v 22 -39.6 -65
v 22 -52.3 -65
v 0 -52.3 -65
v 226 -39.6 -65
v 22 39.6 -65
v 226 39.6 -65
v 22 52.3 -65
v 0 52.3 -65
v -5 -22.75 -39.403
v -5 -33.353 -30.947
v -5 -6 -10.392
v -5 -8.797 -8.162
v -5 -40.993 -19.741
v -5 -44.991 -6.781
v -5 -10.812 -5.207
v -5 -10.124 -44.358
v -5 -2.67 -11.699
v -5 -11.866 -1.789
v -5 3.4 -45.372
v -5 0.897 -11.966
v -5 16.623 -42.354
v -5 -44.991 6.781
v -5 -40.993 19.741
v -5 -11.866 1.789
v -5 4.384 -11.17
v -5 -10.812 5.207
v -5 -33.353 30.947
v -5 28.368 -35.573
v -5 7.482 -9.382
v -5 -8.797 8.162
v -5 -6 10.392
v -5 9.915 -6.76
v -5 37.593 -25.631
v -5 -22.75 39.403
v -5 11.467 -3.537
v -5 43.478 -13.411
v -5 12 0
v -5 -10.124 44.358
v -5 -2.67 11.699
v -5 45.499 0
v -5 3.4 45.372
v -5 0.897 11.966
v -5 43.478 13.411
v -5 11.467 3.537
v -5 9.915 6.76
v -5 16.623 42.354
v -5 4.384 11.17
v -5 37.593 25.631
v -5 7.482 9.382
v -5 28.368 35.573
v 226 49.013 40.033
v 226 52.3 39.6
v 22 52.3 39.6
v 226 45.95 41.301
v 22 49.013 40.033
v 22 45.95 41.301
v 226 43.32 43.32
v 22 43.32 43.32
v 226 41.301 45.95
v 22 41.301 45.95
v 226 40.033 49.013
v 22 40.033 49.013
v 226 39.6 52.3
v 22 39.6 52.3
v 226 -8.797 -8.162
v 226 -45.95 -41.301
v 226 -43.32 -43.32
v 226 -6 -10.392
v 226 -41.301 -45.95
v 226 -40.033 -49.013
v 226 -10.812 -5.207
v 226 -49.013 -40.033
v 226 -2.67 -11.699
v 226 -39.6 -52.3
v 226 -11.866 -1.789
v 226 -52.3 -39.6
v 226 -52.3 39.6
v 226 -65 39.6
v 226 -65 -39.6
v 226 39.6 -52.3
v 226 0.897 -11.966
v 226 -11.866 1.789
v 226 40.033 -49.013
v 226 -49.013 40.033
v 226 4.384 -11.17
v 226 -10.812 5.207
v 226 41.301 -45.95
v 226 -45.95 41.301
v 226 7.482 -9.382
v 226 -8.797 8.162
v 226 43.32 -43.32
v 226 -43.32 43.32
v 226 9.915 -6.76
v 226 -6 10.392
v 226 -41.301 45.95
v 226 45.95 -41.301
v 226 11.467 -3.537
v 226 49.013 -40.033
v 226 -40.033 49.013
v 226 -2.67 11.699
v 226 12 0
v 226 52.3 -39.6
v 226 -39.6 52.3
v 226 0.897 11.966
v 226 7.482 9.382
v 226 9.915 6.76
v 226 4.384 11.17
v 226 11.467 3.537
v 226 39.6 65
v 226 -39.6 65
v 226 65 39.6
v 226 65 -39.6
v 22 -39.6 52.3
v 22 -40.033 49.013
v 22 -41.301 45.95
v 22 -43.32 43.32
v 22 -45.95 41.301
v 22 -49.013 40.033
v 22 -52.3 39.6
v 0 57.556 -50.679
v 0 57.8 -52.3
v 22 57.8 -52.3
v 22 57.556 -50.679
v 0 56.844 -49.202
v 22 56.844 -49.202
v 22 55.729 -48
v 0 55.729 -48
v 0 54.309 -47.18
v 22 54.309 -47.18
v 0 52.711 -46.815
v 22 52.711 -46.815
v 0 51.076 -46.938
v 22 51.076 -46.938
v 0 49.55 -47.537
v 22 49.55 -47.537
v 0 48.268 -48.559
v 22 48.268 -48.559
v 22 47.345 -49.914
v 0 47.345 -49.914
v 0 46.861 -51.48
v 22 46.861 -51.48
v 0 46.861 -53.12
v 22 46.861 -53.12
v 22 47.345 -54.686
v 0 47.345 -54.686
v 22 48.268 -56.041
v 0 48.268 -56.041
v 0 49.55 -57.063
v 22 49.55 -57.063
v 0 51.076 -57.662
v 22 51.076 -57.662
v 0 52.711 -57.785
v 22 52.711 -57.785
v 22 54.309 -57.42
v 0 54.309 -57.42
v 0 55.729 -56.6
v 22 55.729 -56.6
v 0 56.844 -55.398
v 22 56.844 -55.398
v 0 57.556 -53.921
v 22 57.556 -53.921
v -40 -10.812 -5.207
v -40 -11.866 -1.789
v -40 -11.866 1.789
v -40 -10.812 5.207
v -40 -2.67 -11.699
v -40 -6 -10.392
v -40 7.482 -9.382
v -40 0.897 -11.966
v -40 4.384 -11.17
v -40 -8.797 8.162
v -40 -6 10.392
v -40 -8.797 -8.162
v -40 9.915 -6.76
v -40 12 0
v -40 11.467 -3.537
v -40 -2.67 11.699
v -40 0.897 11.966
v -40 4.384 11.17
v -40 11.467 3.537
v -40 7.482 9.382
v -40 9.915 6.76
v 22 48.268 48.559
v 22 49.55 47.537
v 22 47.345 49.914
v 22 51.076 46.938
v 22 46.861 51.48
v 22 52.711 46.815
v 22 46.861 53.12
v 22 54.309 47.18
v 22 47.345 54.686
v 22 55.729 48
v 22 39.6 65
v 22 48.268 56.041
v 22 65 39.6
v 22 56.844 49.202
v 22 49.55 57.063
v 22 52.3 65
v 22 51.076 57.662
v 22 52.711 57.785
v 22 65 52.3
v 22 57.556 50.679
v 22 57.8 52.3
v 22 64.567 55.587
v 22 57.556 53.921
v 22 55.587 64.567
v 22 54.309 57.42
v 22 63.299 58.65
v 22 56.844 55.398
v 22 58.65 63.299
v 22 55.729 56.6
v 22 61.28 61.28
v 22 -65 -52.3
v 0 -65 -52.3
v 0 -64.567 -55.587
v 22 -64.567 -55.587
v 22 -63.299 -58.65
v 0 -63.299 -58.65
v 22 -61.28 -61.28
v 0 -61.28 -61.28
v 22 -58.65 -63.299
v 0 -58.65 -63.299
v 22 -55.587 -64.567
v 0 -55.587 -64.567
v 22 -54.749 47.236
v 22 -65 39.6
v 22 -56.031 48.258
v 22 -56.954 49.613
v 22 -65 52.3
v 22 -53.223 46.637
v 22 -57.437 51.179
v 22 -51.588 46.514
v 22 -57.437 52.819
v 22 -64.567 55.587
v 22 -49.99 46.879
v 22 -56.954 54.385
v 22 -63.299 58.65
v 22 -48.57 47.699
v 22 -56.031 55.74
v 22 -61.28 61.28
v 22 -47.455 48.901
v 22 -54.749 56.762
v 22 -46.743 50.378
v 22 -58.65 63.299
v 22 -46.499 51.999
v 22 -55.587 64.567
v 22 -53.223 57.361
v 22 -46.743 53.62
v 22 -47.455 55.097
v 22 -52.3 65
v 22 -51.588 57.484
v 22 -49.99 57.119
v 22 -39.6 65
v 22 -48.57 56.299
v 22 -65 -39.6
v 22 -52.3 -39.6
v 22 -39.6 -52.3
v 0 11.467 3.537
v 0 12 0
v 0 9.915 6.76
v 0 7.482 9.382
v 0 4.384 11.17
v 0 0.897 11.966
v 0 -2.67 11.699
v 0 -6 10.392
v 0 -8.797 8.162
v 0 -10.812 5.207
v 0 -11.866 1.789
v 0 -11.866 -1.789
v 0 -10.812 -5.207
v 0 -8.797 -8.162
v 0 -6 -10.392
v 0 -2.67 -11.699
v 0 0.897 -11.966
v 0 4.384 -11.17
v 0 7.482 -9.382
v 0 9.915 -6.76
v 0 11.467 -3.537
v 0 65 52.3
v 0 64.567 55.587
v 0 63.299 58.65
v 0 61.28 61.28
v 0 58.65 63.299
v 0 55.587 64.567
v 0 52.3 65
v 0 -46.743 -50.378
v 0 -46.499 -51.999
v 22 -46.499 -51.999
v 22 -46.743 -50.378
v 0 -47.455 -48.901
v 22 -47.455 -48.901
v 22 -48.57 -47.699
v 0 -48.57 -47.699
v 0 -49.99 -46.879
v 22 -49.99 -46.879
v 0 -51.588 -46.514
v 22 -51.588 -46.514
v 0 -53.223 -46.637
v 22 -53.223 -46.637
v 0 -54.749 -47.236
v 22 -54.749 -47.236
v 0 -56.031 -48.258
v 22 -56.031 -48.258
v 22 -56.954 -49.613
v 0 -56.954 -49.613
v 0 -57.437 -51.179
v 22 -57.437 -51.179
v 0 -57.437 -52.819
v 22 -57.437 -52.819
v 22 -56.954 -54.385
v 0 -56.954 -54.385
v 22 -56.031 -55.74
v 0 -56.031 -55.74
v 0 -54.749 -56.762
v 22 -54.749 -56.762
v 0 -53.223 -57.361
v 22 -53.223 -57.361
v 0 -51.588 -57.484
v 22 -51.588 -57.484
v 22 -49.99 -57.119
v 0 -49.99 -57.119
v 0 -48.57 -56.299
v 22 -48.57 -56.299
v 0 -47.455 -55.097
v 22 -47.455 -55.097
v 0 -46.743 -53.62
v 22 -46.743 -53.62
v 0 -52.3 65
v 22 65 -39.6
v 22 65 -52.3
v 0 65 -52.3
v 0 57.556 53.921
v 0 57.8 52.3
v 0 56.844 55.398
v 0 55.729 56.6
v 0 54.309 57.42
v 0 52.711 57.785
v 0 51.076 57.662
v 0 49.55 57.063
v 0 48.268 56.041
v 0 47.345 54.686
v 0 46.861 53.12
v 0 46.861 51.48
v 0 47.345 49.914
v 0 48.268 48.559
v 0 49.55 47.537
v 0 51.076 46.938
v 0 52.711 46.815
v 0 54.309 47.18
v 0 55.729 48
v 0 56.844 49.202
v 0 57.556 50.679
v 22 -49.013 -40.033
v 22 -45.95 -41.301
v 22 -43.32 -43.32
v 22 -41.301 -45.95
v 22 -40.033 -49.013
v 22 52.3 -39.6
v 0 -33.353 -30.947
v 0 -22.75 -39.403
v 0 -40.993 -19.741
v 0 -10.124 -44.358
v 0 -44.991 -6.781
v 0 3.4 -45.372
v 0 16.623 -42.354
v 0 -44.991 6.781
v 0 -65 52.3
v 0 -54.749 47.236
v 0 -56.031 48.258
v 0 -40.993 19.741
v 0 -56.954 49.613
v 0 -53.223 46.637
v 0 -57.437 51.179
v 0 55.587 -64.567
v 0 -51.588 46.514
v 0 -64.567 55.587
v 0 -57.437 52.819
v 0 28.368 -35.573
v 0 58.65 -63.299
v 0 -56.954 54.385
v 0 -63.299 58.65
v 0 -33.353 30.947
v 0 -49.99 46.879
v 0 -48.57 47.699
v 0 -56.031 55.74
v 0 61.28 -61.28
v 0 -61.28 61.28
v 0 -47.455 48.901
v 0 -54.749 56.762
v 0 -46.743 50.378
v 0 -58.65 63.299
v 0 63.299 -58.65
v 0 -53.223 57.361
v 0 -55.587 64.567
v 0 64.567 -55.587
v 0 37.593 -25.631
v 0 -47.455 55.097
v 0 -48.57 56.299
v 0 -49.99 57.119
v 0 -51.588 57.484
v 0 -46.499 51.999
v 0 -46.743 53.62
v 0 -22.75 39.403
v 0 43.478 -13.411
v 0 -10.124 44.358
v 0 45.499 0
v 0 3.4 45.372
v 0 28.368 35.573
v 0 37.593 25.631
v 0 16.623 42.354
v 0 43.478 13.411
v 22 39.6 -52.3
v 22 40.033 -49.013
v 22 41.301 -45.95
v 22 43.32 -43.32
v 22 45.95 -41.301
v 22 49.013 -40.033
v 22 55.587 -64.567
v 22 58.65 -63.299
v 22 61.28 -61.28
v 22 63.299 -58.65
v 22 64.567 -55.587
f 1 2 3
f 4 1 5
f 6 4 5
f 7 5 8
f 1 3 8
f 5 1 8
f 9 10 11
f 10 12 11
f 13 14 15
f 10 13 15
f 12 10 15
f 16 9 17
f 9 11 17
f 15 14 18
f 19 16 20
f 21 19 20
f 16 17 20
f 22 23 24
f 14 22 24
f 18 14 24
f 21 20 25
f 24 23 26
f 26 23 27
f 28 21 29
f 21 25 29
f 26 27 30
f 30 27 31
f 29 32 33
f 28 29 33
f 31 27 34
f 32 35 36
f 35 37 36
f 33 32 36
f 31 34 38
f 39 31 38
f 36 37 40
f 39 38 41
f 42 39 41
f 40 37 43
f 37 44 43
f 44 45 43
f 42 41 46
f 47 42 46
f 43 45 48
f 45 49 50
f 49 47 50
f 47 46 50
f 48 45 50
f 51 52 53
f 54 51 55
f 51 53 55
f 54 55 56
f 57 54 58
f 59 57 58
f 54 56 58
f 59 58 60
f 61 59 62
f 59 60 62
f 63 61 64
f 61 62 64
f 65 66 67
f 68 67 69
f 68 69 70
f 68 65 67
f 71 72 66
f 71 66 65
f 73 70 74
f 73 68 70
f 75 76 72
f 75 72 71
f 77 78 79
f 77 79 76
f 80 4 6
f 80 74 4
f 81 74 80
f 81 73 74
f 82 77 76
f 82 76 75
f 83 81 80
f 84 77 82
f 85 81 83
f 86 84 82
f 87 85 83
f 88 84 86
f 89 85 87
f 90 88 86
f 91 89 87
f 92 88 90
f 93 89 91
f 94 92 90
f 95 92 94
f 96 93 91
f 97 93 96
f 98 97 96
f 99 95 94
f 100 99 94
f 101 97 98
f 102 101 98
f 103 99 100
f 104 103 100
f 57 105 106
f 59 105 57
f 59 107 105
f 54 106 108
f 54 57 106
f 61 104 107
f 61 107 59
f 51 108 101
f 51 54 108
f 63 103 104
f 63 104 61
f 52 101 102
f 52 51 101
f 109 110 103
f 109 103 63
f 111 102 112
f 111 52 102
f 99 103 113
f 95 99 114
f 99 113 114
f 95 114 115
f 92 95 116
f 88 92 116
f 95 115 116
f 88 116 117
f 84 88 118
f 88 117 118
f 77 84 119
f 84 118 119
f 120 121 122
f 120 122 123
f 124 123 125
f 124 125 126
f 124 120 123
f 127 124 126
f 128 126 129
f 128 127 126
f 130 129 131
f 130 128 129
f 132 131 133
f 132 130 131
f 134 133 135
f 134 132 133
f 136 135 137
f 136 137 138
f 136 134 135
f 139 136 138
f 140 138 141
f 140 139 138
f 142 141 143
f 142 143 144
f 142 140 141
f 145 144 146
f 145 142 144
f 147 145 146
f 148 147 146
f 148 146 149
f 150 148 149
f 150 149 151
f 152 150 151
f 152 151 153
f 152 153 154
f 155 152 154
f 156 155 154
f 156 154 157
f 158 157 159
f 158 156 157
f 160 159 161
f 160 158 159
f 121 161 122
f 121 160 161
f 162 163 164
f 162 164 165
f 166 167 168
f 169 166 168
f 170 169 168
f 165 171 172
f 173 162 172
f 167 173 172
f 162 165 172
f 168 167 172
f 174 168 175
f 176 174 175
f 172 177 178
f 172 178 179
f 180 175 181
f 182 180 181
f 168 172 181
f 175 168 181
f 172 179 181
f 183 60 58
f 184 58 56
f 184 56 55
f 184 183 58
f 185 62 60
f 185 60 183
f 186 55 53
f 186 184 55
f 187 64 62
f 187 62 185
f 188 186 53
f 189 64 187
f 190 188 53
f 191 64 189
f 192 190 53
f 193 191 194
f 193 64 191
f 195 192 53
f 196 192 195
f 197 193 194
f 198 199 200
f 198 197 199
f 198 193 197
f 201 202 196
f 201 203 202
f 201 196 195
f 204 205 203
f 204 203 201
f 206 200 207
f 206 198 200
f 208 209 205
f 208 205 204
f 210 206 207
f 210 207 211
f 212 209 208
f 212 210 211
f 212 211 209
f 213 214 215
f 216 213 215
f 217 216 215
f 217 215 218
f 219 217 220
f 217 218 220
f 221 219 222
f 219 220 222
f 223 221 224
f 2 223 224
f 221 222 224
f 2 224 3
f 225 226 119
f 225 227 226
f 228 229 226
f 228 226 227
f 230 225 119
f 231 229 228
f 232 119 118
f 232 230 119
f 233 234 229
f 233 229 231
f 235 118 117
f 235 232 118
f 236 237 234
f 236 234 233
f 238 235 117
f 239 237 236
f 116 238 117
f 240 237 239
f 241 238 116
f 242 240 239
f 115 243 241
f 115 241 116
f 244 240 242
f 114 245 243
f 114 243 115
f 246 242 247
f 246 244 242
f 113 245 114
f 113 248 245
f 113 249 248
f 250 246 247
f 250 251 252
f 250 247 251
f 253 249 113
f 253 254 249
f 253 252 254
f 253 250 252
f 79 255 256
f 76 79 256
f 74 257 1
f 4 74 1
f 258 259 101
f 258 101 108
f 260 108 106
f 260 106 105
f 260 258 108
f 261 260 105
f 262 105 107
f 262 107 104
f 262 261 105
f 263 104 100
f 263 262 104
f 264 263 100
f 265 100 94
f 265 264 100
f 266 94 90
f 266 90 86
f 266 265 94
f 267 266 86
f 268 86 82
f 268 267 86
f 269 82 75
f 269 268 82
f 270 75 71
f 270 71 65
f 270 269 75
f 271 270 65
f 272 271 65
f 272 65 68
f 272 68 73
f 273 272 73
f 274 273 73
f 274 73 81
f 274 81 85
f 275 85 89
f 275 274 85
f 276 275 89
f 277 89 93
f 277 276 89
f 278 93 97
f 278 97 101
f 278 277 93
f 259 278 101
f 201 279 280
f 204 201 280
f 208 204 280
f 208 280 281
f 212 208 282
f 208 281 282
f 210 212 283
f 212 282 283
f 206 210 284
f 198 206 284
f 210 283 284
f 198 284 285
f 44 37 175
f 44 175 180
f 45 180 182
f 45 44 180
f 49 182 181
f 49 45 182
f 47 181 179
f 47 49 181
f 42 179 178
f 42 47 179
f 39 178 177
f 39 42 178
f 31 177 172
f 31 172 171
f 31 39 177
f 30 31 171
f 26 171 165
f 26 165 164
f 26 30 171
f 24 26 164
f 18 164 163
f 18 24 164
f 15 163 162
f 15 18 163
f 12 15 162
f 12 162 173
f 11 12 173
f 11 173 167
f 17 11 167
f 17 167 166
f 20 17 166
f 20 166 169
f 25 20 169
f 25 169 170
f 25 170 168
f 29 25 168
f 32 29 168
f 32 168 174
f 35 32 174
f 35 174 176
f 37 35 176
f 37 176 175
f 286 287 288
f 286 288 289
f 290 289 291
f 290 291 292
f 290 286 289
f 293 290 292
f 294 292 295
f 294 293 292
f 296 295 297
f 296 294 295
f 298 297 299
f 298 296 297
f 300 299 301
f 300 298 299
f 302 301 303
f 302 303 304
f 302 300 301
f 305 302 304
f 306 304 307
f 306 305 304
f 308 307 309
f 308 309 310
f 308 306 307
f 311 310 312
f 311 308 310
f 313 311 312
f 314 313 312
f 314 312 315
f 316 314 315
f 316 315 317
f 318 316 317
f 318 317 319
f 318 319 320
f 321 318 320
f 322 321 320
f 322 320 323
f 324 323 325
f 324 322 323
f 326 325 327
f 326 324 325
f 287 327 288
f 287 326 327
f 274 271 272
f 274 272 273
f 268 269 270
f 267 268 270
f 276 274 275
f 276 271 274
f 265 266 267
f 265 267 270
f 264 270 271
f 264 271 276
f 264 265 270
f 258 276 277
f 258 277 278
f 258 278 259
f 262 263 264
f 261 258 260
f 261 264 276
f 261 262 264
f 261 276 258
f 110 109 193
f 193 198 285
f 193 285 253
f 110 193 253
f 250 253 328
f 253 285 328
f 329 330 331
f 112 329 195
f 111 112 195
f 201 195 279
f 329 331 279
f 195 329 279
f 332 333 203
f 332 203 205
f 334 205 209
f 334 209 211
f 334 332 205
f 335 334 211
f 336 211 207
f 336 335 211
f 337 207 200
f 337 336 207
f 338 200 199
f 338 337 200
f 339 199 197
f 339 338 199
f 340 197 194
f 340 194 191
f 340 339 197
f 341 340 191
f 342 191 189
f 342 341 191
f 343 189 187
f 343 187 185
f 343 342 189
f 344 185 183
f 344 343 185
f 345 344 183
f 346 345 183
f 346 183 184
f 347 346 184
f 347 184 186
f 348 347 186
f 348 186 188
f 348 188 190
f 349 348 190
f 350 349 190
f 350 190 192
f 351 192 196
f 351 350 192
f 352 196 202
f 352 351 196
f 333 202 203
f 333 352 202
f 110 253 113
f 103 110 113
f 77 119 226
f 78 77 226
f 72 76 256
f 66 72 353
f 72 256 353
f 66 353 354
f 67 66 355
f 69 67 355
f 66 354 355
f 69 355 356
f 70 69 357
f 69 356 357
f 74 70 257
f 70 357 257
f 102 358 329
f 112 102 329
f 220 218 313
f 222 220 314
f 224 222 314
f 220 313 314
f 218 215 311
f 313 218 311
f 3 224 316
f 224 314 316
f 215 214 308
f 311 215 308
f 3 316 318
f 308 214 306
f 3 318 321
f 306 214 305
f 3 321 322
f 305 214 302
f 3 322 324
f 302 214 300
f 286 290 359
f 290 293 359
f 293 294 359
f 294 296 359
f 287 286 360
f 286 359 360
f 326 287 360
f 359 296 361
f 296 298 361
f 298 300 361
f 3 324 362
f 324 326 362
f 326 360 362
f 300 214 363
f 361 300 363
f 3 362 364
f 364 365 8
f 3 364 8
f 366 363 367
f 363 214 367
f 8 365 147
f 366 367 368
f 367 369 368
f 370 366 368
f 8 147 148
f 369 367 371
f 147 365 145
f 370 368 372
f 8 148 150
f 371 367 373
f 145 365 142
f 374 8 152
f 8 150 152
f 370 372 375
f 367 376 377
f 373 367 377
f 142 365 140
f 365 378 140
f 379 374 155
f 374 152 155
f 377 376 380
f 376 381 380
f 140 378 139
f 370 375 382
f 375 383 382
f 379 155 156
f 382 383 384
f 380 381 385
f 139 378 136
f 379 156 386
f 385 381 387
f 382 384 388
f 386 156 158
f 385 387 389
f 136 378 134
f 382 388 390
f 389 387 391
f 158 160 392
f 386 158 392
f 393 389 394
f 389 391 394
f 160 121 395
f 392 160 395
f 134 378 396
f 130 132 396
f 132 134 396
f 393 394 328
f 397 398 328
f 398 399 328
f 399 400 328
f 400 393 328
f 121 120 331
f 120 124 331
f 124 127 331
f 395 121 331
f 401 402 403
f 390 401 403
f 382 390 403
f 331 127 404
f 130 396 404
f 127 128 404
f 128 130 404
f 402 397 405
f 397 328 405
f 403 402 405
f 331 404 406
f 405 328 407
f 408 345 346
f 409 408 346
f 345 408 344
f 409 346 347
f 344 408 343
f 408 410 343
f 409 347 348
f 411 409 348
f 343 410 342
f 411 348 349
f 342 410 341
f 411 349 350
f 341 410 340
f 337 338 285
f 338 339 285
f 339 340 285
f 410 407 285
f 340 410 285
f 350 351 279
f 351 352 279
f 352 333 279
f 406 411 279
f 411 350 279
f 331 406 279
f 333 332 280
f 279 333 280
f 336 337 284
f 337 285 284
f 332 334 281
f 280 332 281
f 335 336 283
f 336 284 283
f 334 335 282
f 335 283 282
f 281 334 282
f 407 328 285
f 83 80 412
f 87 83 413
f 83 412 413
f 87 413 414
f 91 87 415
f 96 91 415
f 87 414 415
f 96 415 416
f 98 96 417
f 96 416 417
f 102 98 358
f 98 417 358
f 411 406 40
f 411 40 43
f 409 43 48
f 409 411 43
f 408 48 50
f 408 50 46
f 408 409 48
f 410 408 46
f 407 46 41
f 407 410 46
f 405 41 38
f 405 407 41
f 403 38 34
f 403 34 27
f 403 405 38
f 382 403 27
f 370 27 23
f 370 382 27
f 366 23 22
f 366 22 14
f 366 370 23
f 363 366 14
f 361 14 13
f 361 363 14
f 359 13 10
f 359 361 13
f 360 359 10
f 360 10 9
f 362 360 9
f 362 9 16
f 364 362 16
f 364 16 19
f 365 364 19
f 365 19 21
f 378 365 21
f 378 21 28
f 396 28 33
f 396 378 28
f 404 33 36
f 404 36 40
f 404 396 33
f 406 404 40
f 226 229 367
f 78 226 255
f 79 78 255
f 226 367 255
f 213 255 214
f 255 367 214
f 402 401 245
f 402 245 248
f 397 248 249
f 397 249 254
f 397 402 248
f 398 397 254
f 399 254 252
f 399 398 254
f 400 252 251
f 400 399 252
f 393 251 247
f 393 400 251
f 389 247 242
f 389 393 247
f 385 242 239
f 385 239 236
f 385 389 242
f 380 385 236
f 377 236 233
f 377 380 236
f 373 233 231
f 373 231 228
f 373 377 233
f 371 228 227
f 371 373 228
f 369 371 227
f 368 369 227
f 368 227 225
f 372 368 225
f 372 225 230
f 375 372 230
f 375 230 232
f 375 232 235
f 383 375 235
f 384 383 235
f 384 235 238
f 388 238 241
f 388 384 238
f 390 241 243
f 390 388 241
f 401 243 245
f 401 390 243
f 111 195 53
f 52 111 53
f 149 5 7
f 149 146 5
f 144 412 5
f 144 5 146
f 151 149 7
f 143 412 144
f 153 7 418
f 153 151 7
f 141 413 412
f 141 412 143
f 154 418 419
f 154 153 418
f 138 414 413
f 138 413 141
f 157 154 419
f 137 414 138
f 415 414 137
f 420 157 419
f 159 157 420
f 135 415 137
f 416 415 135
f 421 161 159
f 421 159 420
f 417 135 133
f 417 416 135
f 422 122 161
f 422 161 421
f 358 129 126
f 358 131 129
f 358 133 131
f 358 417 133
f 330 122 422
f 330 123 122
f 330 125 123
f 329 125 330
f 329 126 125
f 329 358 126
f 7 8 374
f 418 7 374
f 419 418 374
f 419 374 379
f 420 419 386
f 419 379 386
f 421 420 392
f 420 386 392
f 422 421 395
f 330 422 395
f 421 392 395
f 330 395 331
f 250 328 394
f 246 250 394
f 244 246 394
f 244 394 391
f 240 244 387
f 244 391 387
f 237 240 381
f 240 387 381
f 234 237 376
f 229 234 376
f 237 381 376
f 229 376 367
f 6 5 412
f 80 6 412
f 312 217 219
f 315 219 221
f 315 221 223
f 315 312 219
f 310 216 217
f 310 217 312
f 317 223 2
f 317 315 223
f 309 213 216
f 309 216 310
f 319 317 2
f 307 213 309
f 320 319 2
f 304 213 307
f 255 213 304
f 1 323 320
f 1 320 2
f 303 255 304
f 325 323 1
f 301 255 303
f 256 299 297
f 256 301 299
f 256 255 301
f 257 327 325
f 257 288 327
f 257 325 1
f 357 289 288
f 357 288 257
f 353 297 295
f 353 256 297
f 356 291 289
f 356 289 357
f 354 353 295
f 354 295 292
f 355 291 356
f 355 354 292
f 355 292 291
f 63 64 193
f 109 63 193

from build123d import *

# Parameters (mm, degrees)
F0_R     = 12
F1_DEPTH = 40
F0_R_2   = 45.49902
F2_DEPTH = 5
F3_DEPTH = 226
F0_R_3   = 5.5
F4_DEPTH = 22


with BuildPart() as f1:
    # F0 (on Right) → F1 (new body)
    with BuildSketch(Plane.YZ):
        Circle(F0_R)
    extrude(amount=-F1_DEPTH)

    # F0 (on Right) → F2 (join)
    with BuildSketch(Plane.YZ):
        Circle(F0_R_2)
        Circle(F0_R, mode=Mode.SUBTRACT)
    extrude(amount=-F2_DEPTH)

    # F0 (on Right) → F3 (join)
    with BuildSketch(Plane.YZ):
        with BuildLine():
            Line((-39.6, -65), (39.6, -65))
            Line((39.6, -65), (39.6, -52.3))
            ThreePointArc((39.6, -52.3), (43.3197438789, -43.3197438789), (52.3, -39.6))
            Line((52.3, -39.6), (65, -39.6))
            Line((65, -39.6), (65, 39.6))
            Line((65, 39.6), (52.3, 39.6))
            ThreePointArc((52.3, 39.6), (43.3197438789, 43.3197438789), (39.6, 52.3))
            Line((39.6, 52.3), (39.6, 65))
            Line((39.6, 65), (-39.6, 65))
            Line((-39.6, 65), (-39.6, 52.3))
            ThreePointArc((-39.6, 52.3), (-43.3197438789, 43.3197438789), (-52.3, 39.6))
            Line((-52.3, 39.6), (-65, 39.6))
            Line((-65, 39.6), (-65, -39.6))
            Line((-65, -39.6), (-52.3, -39.6))
            ThreePointArc((-52.3, -39.6), (-43.3197438789, -43.3197438789), (-39.6, -52.3))
            Line((-39.6, -52.3), (-39.6, -65))
        make_face()
        Circle(F0_R_2, mode=Mode.SUBTRACT)
        Circle(F0_R_2)
        Circle(F0_R, mode=Mode.SUBTRACT)
    extrude(amount=F3_DEPTH)

    # F0 (on Right) → F4 (join)
    with BuildSketch(Plane.YZ):
        with BuildLine():
            Line((-65, 52.3), (-65, 39.6))
            Line((-65, 39.6), (-52.3, 39.6))
            ThreePointArc((-52.3, 39.6), (-43.3197438789, 43.3197438789), (-39.6, 52.3))
            Line((-39.6, 52.3), (-39.6, 65))
            Line((-39.6, 65), (-52.3, 65))
            ThreePointArc((-52.3, 65), (-61.2802561211, 61.2802561211), (-65, 52.3))
        make_face()
        with Locations((-51.99888, 51.99888)):
            Circle(F0_R_3, mode=Mode.SUBTRACT)
        with BuildLine():
            Line((52.3, 39.6), (65, 39.6))
            Line((65, 39.6), (65, 52.3))
            ThreePointArc((65, 52.3), (61.2802561211, 61.2802561211), (52.3, 65))
            Line((52.3, 65), (39.6, 65))
            Line((39.6, 65), (39.6, 52.3))
            ThreePointArc((39.6, 52.3), (43.3197438789, 43.3197438789), (52.3, 39.6))
        make_face()
        with Locations((52.3, 52.3)):
            Circle(F0_R_3, mode=Mode.SUBTRACT)
        with BuildLine():
            Line((39.6, -65), (52.3, -65))
            ThreePointArc((52.3, -65), (61.2802561211, -61.2802561211), (65, -52.3))
            Line((65, -52.3), (65, -39.6))
            Line((65, -39.6), (52.3, -39.6))
            ThreePointArc((52.3, -39.6), (43.3197438789, -43.3197438789), (39.6, -52.3))
            Line((39.6, -52.3), (39.6, -65))
        make_face()
        with Locations((52.3, -52.3)):
            Circle(F0_R_3, mode=Mode.SUBTRACT)
        with BuildLine():
            Line((-52.3, -65), (-39.6, -65))
            Line((-39.6, -65), (-39.6, -52.3))
            ThreePointArc((-39.6, -52.3), (-43.3197438789, -43.3197438789), (-52.3, -39.6))
            Line((-52.3, -39.6), (-65, -39.6))
            Line((-65, -39.6), (-65, -52.3))
            ThreePointArc((-65, -52.3), (-61.2802561211, -61.2802561211), (-52.3, -65))
        make_face()
        with Locations((-51.99888, -51.99888)):
            Circle(F0_R_3, mode=Mode.SUBTRACT)
    extrude(amount=F4_DEPTH)


solid = f1.part
